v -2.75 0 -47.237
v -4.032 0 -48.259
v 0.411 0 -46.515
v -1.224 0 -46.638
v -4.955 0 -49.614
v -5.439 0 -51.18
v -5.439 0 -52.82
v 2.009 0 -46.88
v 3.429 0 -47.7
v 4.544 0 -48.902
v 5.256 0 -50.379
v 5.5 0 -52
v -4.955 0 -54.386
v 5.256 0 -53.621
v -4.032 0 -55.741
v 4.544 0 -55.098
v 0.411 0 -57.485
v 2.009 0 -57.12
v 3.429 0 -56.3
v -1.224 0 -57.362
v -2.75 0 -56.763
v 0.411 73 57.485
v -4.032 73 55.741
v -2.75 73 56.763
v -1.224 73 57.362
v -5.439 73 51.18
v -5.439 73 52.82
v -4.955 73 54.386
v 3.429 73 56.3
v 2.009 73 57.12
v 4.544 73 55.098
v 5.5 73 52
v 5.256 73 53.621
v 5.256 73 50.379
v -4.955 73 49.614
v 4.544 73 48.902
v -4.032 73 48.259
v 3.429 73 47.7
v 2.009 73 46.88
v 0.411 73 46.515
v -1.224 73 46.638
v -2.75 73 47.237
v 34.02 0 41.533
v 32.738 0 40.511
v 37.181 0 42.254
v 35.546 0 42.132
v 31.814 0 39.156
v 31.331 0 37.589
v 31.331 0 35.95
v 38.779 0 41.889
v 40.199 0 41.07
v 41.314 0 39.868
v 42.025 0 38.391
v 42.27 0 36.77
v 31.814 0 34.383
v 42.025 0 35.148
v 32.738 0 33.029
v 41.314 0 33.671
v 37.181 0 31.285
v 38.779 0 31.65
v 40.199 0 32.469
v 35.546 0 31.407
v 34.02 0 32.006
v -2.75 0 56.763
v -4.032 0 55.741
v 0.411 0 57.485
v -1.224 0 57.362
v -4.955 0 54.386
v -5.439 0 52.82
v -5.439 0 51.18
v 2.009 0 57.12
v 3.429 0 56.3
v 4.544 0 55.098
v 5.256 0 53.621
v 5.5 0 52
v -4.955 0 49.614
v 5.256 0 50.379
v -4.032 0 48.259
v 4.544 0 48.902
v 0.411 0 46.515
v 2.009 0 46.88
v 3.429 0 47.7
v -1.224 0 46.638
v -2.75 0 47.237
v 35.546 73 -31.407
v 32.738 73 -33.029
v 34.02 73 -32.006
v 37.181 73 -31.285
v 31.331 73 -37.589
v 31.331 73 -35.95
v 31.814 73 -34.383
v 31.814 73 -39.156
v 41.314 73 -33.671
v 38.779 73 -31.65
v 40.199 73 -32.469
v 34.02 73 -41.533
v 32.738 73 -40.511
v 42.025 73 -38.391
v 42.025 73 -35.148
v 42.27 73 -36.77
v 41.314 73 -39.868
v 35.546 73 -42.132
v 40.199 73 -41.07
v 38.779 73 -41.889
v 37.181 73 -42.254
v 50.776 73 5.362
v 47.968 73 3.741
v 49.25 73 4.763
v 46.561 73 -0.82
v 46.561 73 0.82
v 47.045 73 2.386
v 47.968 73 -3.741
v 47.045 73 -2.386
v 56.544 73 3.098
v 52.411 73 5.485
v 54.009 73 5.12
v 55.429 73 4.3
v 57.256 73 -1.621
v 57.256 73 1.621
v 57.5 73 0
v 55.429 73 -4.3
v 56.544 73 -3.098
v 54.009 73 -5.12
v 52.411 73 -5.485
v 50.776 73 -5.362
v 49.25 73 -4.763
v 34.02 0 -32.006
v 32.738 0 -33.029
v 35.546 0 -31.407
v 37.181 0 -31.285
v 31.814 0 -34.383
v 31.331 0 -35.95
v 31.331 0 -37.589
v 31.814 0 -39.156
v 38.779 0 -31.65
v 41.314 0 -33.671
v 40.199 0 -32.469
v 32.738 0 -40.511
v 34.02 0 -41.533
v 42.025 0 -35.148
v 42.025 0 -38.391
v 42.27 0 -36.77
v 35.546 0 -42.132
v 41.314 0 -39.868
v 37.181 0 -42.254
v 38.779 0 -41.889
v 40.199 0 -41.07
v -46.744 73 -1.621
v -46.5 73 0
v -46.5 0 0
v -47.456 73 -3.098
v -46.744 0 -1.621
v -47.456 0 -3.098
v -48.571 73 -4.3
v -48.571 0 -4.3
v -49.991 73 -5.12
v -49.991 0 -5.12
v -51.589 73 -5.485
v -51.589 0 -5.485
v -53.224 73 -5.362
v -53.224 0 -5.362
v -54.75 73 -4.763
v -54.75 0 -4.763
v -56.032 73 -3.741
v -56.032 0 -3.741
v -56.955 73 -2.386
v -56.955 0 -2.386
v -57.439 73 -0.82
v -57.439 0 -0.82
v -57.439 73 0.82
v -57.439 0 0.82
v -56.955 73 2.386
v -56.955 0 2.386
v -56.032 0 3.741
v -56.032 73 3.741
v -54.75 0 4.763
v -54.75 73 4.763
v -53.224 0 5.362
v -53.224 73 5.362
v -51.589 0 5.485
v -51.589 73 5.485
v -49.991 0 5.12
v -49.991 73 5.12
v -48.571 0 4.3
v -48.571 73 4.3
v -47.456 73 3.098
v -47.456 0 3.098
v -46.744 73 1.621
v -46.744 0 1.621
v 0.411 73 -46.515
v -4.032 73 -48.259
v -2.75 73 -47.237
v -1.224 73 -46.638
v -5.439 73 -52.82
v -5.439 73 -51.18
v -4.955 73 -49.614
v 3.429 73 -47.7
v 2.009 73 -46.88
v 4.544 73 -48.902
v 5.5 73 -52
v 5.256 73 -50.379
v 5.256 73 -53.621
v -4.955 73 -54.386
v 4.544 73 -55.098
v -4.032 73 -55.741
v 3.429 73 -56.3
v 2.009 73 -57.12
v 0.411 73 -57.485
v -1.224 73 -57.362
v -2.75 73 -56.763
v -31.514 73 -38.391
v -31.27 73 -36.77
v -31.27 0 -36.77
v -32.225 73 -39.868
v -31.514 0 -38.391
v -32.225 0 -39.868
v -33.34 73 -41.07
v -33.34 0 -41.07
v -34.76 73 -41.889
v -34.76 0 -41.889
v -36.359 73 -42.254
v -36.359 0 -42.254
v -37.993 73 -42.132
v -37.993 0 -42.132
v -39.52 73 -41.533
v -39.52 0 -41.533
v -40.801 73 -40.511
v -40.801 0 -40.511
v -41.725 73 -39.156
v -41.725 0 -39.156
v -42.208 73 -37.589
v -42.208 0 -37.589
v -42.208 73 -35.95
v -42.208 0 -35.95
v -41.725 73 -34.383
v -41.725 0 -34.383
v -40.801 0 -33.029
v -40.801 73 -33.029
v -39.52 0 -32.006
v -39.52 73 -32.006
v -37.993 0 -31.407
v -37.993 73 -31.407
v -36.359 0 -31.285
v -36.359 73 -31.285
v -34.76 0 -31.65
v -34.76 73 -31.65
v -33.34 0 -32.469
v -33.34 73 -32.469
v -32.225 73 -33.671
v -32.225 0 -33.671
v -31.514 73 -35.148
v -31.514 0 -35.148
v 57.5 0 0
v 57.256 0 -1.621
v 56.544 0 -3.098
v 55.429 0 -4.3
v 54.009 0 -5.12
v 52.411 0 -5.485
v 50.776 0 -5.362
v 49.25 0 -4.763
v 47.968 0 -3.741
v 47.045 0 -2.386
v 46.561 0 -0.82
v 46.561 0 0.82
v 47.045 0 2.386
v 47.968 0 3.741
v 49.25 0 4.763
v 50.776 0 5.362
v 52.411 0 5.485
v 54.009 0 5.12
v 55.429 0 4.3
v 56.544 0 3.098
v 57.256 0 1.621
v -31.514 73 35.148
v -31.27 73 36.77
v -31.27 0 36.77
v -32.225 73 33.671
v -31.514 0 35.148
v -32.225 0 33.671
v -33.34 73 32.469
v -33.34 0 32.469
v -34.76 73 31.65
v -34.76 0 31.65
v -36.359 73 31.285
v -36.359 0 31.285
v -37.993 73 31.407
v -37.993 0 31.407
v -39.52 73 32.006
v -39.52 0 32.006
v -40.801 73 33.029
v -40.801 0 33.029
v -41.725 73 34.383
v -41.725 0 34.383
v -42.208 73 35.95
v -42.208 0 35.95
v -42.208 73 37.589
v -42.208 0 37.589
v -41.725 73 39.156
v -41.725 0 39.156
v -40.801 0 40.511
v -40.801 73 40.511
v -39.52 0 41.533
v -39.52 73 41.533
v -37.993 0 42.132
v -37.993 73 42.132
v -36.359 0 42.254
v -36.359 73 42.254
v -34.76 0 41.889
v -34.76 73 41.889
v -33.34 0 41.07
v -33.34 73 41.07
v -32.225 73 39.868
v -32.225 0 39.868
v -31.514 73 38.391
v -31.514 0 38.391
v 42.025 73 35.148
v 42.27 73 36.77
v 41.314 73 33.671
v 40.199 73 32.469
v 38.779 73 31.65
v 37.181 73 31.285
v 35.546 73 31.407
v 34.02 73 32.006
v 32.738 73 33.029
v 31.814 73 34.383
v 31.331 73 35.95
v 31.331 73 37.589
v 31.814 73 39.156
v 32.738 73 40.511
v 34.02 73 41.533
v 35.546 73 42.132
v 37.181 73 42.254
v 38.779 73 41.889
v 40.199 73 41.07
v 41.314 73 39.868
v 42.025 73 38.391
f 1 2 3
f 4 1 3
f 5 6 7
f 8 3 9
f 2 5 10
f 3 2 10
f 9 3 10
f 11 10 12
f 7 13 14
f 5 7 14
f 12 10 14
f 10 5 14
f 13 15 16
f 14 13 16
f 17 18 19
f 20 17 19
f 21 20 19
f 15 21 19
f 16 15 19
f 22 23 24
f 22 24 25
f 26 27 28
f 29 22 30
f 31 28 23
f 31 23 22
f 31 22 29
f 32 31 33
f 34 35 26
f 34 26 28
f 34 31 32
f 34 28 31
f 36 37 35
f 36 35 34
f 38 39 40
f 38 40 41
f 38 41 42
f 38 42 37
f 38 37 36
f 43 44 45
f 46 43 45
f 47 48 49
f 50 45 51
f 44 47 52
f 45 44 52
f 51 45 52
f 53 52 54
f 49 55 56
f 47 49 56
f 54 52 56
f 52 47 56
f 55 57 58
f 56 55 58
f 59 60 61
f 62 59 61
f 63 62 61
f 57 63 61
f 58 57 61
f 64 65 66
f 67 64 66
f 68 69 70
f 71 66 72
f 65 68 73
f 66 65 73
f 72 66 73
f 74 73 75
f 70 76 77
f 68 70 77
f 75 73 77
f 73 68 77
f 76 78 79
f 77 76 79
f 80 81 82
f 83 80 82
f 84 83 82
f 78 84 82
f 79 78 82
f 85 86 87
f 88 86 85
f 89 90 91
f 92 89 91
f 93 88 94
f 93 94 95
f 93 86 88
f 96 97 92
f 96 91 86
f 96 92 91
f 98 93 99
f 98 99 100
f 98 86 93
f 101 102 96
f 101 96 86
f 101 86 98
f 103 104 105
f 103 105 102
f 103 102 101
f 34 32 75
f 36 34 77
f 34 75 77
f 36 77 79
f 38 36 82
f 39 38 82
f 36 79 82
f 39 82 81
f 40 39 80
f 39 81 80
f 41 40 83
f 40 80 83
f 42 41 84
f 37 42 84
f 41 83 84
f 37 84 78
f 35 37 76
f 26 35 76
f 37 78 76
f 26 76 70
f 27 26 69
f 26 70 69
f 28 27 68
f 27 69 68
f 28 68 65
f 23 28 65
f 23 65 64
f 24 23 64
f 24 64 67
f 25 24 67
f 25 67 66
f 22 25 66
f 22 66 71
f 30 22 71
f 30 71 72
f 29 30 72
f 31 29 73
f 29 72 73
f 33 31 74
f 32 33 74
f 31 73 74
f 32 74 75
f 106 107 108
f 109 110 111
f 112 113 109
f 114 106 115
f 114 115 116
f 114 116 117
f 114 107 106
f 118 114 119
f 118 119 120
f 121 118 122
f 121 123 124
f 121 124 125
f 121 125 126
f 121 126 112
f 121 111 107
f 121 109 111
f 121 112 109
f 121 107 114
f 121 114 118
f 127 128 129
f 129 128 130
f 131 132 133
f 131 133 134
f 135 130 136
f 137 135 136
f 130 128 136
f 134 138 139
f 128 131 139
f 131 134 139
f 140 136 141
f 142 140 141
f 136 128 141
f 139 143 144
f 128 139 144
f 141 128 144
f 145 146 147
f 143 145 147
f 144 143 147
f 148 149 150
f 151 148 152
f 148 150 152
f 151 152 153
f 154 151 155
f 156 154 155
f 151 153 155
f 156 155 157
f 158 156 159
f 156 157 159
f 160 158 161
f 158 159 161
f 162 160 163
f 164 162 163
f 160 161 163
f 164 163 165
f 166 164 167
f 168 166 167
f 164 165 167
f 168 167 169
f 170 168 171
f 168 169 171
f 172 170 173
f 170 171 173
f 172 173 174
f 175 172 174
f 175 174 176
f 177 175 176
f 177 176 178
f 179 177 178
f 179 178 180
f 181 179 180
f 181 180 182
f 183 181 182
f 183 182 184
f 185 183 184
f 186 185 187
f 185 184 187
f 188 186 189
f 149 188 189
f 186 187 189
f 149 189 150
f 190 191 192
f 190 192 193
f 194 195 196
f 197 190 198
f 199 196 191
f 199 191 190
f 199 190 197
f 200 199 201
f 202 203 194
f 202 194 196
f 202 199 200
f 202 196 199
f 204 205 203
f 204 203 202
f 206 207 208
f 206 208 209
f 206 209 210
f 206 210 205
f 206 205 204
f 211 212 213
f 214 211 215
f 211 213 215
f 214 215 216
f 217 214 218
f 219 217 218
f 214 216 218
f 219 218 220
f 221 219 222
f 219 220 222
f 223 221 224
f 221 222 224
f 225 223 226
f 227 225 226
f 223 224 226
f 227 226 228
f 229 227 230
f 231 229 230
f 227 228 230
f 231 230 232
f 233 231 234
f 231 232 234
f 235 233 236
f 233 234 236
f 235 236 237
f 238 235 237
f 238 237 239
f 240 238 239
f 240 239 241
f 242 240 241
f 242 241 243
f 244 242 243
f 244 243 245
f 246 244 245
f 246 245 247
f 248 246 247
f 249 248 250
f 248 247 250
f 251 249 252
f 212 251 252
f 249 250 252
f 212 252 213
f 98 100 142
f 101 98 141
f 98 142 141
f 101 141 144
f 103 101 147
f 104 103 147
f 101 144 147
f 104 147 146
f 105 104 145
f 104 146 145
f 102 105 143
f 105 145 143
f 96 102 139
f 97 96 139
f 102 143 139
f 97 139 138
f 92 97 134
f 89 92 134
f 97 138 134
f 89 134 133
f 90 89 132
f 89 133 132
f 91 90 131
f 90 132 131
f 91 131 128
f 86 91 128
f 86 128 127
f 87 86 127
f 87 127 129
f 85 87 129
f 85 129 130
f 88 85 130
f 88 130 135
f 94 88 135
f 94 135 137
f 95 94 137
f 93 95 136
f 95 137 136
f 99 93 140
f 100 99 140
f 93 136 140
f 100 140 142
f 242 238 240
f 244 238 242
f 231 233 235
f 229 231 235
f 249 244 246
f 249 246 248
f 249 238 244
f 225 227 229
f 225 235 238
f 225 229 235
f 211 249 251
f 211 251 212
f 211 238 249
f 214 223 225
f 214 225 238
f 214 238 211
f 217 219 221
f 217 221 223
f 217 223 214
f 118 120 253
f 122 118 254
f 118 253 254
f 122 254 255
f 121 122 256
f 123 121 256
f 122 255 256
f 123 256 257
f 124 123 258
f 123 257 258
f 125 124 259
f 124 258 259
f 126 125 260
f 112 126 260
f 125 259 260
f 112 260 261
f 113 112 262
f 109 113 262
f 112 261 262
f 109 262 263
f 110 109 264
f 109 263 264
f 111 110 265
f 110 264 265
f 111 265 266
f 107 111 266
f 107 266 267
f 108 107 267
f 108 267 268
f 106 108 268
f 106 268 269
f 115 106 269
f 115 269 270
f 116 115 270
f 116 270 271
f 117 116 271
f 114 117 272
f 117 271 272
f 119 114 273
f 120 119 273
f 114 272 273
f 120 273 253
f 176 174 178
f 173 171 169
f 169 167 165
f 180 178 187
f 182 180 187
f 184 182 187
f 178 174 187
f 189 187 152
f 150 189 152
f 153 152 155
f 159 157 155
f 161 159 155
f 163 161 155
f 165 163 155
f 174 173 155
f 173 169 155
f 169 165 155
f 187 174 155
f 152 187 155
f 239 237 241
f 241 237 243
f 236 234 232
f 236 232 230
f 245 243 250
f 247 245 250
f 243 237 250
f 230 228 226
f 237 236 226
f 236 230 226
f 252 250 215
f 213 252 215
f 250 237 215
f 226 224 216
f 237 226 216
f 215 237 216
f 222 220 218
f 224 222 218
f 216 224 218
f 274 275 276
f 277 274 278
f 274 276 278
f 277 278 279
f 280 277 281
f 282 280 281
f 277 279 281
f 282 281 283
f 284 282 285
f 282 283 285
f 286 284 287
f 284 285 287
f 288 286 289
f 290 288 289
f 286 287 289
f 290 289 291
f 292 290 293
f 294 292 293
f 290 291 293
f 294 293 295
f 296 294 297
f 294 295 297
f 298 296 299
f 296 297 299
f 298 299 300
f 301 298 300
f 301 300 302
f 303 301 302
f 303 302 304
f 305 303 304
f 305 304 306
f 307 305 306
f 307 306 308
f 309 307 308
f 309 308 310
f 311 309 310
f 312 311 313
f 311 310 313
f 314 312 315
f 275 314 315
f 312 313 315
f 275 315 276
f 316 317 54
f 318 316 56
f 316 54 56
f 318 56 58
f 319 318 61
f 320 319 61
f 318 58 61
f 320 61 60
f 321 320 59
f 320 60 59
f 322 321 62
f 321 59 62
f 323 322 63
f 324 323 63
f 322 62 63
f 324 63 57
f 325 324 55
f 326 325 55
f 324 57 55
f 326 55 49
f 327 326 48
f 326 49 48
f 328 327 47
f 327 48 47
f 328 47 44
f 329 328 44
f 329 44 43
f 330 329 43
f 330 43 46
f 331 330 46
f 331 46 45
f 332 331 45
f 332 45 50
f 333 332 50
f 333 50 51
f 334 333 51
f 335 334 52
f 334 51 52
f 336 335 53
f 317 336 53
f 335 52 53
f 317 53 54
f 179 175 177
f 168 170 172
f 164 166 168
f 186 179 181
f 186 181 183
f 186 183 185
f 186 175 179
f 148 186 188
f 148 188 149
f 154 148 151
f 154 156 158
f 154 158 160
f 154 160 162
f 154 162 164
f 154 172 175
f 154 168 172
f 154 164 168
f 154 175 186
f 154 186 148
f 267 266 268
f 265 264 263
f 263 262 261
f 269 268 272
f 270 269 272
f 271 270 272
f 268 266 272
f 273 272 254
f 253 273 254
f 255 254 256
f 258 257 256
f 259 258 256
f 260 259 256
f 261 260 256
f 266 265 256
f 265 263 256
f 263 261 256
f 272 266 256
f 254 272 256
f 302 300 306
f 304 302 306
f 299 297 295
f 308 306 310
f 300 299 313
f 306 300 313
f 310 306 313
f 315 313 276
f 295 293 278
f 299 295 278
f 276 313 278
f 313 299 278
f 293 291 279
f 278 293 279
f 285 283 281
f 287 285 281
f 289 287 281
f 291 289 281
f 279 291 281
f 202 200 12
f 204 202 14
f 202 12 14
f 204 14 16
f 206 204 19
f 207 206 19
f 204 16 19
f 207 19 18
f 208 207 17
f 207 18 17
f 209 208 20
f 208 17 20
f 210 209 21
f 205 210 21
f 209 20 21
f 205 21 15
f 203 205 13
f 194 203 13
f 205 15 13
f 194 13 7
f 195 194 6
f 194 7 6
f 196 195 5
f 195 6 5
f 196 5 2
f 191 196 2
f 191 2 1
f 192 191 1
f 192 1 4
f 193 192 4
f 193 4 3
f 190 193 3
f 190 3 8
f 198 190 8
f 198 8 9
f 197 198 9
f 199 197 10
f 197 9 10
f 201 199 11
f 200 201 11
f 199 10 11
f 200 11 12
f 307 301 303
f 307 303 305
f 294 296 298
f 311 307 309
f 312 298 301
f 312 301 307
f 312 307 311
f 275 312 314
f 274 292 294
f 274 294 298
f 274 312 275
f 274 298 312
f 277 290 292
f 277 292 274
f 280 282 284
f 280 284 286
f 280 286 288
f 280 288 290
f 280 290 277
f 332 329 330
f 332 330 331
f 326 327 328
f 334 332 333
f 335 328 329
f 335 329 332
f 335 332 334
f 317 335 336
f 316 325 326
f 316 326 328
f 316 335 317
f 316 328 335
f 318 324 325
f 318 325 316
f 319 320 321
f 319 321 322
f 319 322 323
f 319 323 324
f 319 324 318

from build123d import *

# Parameters (mm, degrees)
SKETCH1_R             = 5.5
BOSS_EXTRUDE1_DEPTH   = 73
BOSS_EXTRUDE1_2_DEPTH = 73
BOSS_EXTRUDE1_3_DEPTH = 73
BOSS_EXTRUDE1_4_DEPTH = 73
BOSS_EXTRUDE1_5_DEPTH = 73
BOSS_EXTRUDE1_6_DEPTH = 73
BOSS_EXTRUDE1_7_DEPTH = 73
BOSS_EXTRUDE1_8_DEPTH = 73


with BuildPart() as part:
    # Sketch1 → Boss-Extrude1 (new body)
    with BuildSketch(Plane(origin=(0, 0, 0), x_dir=(1, 0, 0), z_dir=(0, 1, 0))):
        with Locations((-52, 0)):
            Circle(SKETCH1_R)
    extrude(amount=BOSS_EXTRUDE1_DEPTH)


with BuildPart() as body_2:
    # Sketch1 → Boss-Extrude1 2 (new body)
    with BuildSketch(Plane(origin=(0, 0, 0), x_dir=(1, 0, 0), z_dir=(0, 1, 0))):
        with Locations((-36.769552622, 36.769552622)):
            Circle(SKETCH1_R)
    extrude(amount=BOSS_EXTRUDE1_2_DEPTH)


with BuildPart() as body_3:
    # Sketch1 → Boss-Extrude1 3 (new body)
    with BuildSketch(Plane(origin=(0, 0, 0), x_dir=(1, 0, 0), z_dir=(0, 1, 0))):
        with Locations((0, 52)):
            Circle(SKETCH1_R)
    extrude(amount=BOSS_EXTRUDE1_3_DEPTH)


with BuildPart() as body_4:
    # Sketch1 → Boss-Extrude1 4 (new body)
    with BuildSketch(Plane(origin=(0, 0, 0), x_dir=(1, 0, 0), z_dir=(0, 1, 0))):
        with Locations((36.769552622, 36.769552622)):
            Circle(SKETCH1_R)
    extrude(amount=BOSS_EXTRUDE1_4_DEPTH)


with BuildPart() as body_5:
    # Sketch1 → Boss-Extrude1 5 (new body)
    with BuildSketch(Plane(origin=(0, 0, 0), x_dir=(1, 0, 0), z_dir=(0, 1, 0))):
        with Locations((52, 0)):
            Circle(SKETCH1_R)
    extrude(amount=BOSS_EXTRUDE1_5_DEPTH)


with BuildPart() as body_6:
    # Sketch1 → Boss-Extrude1 6 (new body)
    with BuildSketch(Plane(origin=(0, 0, 0), x_dir=(1, 0, 0), z_dir=(0, 1, 0))):
        with Locations((36.769552622, -36.769552622)):
            Circle(SKETCH1_R)
    extrude(amount=BOSS_EXTRUDE1_6_DEPTH)


with BuildPart() as body_7:
    # Sketch1 → Boss-Extrude1 7 (new body)
    with BuildSketch(Plane(origin=(0, 0, 0), x_dir=(1, 0, 0), z_dir=(0, 1, 0))):
        with Locations((0, -52)):
            Circle(SKETCH1_R)
    extrude(amount=BOSS_EXTRUDE1_7_DEPTH)


with BuildPart() as body_8:
    # Sketch1 → Boss-Extrude1 8 (new body)
    with BuildSketch(Plane(origin=(0, 0, 0), x_dir=(1, 0, 0), z_dir=(0, 1, 0))):
        with Locations((-36.769552622, -36.769552622)):
            Circle(SKETCH1_R)
    extrude(amount=BOSS_EXTRUDE1_8_DEPTH)


solid = Compound([part.part, body_2.part, body_3.part, body_4.part, body_5.part, body_6.part, body_7.part, body_8.part])
